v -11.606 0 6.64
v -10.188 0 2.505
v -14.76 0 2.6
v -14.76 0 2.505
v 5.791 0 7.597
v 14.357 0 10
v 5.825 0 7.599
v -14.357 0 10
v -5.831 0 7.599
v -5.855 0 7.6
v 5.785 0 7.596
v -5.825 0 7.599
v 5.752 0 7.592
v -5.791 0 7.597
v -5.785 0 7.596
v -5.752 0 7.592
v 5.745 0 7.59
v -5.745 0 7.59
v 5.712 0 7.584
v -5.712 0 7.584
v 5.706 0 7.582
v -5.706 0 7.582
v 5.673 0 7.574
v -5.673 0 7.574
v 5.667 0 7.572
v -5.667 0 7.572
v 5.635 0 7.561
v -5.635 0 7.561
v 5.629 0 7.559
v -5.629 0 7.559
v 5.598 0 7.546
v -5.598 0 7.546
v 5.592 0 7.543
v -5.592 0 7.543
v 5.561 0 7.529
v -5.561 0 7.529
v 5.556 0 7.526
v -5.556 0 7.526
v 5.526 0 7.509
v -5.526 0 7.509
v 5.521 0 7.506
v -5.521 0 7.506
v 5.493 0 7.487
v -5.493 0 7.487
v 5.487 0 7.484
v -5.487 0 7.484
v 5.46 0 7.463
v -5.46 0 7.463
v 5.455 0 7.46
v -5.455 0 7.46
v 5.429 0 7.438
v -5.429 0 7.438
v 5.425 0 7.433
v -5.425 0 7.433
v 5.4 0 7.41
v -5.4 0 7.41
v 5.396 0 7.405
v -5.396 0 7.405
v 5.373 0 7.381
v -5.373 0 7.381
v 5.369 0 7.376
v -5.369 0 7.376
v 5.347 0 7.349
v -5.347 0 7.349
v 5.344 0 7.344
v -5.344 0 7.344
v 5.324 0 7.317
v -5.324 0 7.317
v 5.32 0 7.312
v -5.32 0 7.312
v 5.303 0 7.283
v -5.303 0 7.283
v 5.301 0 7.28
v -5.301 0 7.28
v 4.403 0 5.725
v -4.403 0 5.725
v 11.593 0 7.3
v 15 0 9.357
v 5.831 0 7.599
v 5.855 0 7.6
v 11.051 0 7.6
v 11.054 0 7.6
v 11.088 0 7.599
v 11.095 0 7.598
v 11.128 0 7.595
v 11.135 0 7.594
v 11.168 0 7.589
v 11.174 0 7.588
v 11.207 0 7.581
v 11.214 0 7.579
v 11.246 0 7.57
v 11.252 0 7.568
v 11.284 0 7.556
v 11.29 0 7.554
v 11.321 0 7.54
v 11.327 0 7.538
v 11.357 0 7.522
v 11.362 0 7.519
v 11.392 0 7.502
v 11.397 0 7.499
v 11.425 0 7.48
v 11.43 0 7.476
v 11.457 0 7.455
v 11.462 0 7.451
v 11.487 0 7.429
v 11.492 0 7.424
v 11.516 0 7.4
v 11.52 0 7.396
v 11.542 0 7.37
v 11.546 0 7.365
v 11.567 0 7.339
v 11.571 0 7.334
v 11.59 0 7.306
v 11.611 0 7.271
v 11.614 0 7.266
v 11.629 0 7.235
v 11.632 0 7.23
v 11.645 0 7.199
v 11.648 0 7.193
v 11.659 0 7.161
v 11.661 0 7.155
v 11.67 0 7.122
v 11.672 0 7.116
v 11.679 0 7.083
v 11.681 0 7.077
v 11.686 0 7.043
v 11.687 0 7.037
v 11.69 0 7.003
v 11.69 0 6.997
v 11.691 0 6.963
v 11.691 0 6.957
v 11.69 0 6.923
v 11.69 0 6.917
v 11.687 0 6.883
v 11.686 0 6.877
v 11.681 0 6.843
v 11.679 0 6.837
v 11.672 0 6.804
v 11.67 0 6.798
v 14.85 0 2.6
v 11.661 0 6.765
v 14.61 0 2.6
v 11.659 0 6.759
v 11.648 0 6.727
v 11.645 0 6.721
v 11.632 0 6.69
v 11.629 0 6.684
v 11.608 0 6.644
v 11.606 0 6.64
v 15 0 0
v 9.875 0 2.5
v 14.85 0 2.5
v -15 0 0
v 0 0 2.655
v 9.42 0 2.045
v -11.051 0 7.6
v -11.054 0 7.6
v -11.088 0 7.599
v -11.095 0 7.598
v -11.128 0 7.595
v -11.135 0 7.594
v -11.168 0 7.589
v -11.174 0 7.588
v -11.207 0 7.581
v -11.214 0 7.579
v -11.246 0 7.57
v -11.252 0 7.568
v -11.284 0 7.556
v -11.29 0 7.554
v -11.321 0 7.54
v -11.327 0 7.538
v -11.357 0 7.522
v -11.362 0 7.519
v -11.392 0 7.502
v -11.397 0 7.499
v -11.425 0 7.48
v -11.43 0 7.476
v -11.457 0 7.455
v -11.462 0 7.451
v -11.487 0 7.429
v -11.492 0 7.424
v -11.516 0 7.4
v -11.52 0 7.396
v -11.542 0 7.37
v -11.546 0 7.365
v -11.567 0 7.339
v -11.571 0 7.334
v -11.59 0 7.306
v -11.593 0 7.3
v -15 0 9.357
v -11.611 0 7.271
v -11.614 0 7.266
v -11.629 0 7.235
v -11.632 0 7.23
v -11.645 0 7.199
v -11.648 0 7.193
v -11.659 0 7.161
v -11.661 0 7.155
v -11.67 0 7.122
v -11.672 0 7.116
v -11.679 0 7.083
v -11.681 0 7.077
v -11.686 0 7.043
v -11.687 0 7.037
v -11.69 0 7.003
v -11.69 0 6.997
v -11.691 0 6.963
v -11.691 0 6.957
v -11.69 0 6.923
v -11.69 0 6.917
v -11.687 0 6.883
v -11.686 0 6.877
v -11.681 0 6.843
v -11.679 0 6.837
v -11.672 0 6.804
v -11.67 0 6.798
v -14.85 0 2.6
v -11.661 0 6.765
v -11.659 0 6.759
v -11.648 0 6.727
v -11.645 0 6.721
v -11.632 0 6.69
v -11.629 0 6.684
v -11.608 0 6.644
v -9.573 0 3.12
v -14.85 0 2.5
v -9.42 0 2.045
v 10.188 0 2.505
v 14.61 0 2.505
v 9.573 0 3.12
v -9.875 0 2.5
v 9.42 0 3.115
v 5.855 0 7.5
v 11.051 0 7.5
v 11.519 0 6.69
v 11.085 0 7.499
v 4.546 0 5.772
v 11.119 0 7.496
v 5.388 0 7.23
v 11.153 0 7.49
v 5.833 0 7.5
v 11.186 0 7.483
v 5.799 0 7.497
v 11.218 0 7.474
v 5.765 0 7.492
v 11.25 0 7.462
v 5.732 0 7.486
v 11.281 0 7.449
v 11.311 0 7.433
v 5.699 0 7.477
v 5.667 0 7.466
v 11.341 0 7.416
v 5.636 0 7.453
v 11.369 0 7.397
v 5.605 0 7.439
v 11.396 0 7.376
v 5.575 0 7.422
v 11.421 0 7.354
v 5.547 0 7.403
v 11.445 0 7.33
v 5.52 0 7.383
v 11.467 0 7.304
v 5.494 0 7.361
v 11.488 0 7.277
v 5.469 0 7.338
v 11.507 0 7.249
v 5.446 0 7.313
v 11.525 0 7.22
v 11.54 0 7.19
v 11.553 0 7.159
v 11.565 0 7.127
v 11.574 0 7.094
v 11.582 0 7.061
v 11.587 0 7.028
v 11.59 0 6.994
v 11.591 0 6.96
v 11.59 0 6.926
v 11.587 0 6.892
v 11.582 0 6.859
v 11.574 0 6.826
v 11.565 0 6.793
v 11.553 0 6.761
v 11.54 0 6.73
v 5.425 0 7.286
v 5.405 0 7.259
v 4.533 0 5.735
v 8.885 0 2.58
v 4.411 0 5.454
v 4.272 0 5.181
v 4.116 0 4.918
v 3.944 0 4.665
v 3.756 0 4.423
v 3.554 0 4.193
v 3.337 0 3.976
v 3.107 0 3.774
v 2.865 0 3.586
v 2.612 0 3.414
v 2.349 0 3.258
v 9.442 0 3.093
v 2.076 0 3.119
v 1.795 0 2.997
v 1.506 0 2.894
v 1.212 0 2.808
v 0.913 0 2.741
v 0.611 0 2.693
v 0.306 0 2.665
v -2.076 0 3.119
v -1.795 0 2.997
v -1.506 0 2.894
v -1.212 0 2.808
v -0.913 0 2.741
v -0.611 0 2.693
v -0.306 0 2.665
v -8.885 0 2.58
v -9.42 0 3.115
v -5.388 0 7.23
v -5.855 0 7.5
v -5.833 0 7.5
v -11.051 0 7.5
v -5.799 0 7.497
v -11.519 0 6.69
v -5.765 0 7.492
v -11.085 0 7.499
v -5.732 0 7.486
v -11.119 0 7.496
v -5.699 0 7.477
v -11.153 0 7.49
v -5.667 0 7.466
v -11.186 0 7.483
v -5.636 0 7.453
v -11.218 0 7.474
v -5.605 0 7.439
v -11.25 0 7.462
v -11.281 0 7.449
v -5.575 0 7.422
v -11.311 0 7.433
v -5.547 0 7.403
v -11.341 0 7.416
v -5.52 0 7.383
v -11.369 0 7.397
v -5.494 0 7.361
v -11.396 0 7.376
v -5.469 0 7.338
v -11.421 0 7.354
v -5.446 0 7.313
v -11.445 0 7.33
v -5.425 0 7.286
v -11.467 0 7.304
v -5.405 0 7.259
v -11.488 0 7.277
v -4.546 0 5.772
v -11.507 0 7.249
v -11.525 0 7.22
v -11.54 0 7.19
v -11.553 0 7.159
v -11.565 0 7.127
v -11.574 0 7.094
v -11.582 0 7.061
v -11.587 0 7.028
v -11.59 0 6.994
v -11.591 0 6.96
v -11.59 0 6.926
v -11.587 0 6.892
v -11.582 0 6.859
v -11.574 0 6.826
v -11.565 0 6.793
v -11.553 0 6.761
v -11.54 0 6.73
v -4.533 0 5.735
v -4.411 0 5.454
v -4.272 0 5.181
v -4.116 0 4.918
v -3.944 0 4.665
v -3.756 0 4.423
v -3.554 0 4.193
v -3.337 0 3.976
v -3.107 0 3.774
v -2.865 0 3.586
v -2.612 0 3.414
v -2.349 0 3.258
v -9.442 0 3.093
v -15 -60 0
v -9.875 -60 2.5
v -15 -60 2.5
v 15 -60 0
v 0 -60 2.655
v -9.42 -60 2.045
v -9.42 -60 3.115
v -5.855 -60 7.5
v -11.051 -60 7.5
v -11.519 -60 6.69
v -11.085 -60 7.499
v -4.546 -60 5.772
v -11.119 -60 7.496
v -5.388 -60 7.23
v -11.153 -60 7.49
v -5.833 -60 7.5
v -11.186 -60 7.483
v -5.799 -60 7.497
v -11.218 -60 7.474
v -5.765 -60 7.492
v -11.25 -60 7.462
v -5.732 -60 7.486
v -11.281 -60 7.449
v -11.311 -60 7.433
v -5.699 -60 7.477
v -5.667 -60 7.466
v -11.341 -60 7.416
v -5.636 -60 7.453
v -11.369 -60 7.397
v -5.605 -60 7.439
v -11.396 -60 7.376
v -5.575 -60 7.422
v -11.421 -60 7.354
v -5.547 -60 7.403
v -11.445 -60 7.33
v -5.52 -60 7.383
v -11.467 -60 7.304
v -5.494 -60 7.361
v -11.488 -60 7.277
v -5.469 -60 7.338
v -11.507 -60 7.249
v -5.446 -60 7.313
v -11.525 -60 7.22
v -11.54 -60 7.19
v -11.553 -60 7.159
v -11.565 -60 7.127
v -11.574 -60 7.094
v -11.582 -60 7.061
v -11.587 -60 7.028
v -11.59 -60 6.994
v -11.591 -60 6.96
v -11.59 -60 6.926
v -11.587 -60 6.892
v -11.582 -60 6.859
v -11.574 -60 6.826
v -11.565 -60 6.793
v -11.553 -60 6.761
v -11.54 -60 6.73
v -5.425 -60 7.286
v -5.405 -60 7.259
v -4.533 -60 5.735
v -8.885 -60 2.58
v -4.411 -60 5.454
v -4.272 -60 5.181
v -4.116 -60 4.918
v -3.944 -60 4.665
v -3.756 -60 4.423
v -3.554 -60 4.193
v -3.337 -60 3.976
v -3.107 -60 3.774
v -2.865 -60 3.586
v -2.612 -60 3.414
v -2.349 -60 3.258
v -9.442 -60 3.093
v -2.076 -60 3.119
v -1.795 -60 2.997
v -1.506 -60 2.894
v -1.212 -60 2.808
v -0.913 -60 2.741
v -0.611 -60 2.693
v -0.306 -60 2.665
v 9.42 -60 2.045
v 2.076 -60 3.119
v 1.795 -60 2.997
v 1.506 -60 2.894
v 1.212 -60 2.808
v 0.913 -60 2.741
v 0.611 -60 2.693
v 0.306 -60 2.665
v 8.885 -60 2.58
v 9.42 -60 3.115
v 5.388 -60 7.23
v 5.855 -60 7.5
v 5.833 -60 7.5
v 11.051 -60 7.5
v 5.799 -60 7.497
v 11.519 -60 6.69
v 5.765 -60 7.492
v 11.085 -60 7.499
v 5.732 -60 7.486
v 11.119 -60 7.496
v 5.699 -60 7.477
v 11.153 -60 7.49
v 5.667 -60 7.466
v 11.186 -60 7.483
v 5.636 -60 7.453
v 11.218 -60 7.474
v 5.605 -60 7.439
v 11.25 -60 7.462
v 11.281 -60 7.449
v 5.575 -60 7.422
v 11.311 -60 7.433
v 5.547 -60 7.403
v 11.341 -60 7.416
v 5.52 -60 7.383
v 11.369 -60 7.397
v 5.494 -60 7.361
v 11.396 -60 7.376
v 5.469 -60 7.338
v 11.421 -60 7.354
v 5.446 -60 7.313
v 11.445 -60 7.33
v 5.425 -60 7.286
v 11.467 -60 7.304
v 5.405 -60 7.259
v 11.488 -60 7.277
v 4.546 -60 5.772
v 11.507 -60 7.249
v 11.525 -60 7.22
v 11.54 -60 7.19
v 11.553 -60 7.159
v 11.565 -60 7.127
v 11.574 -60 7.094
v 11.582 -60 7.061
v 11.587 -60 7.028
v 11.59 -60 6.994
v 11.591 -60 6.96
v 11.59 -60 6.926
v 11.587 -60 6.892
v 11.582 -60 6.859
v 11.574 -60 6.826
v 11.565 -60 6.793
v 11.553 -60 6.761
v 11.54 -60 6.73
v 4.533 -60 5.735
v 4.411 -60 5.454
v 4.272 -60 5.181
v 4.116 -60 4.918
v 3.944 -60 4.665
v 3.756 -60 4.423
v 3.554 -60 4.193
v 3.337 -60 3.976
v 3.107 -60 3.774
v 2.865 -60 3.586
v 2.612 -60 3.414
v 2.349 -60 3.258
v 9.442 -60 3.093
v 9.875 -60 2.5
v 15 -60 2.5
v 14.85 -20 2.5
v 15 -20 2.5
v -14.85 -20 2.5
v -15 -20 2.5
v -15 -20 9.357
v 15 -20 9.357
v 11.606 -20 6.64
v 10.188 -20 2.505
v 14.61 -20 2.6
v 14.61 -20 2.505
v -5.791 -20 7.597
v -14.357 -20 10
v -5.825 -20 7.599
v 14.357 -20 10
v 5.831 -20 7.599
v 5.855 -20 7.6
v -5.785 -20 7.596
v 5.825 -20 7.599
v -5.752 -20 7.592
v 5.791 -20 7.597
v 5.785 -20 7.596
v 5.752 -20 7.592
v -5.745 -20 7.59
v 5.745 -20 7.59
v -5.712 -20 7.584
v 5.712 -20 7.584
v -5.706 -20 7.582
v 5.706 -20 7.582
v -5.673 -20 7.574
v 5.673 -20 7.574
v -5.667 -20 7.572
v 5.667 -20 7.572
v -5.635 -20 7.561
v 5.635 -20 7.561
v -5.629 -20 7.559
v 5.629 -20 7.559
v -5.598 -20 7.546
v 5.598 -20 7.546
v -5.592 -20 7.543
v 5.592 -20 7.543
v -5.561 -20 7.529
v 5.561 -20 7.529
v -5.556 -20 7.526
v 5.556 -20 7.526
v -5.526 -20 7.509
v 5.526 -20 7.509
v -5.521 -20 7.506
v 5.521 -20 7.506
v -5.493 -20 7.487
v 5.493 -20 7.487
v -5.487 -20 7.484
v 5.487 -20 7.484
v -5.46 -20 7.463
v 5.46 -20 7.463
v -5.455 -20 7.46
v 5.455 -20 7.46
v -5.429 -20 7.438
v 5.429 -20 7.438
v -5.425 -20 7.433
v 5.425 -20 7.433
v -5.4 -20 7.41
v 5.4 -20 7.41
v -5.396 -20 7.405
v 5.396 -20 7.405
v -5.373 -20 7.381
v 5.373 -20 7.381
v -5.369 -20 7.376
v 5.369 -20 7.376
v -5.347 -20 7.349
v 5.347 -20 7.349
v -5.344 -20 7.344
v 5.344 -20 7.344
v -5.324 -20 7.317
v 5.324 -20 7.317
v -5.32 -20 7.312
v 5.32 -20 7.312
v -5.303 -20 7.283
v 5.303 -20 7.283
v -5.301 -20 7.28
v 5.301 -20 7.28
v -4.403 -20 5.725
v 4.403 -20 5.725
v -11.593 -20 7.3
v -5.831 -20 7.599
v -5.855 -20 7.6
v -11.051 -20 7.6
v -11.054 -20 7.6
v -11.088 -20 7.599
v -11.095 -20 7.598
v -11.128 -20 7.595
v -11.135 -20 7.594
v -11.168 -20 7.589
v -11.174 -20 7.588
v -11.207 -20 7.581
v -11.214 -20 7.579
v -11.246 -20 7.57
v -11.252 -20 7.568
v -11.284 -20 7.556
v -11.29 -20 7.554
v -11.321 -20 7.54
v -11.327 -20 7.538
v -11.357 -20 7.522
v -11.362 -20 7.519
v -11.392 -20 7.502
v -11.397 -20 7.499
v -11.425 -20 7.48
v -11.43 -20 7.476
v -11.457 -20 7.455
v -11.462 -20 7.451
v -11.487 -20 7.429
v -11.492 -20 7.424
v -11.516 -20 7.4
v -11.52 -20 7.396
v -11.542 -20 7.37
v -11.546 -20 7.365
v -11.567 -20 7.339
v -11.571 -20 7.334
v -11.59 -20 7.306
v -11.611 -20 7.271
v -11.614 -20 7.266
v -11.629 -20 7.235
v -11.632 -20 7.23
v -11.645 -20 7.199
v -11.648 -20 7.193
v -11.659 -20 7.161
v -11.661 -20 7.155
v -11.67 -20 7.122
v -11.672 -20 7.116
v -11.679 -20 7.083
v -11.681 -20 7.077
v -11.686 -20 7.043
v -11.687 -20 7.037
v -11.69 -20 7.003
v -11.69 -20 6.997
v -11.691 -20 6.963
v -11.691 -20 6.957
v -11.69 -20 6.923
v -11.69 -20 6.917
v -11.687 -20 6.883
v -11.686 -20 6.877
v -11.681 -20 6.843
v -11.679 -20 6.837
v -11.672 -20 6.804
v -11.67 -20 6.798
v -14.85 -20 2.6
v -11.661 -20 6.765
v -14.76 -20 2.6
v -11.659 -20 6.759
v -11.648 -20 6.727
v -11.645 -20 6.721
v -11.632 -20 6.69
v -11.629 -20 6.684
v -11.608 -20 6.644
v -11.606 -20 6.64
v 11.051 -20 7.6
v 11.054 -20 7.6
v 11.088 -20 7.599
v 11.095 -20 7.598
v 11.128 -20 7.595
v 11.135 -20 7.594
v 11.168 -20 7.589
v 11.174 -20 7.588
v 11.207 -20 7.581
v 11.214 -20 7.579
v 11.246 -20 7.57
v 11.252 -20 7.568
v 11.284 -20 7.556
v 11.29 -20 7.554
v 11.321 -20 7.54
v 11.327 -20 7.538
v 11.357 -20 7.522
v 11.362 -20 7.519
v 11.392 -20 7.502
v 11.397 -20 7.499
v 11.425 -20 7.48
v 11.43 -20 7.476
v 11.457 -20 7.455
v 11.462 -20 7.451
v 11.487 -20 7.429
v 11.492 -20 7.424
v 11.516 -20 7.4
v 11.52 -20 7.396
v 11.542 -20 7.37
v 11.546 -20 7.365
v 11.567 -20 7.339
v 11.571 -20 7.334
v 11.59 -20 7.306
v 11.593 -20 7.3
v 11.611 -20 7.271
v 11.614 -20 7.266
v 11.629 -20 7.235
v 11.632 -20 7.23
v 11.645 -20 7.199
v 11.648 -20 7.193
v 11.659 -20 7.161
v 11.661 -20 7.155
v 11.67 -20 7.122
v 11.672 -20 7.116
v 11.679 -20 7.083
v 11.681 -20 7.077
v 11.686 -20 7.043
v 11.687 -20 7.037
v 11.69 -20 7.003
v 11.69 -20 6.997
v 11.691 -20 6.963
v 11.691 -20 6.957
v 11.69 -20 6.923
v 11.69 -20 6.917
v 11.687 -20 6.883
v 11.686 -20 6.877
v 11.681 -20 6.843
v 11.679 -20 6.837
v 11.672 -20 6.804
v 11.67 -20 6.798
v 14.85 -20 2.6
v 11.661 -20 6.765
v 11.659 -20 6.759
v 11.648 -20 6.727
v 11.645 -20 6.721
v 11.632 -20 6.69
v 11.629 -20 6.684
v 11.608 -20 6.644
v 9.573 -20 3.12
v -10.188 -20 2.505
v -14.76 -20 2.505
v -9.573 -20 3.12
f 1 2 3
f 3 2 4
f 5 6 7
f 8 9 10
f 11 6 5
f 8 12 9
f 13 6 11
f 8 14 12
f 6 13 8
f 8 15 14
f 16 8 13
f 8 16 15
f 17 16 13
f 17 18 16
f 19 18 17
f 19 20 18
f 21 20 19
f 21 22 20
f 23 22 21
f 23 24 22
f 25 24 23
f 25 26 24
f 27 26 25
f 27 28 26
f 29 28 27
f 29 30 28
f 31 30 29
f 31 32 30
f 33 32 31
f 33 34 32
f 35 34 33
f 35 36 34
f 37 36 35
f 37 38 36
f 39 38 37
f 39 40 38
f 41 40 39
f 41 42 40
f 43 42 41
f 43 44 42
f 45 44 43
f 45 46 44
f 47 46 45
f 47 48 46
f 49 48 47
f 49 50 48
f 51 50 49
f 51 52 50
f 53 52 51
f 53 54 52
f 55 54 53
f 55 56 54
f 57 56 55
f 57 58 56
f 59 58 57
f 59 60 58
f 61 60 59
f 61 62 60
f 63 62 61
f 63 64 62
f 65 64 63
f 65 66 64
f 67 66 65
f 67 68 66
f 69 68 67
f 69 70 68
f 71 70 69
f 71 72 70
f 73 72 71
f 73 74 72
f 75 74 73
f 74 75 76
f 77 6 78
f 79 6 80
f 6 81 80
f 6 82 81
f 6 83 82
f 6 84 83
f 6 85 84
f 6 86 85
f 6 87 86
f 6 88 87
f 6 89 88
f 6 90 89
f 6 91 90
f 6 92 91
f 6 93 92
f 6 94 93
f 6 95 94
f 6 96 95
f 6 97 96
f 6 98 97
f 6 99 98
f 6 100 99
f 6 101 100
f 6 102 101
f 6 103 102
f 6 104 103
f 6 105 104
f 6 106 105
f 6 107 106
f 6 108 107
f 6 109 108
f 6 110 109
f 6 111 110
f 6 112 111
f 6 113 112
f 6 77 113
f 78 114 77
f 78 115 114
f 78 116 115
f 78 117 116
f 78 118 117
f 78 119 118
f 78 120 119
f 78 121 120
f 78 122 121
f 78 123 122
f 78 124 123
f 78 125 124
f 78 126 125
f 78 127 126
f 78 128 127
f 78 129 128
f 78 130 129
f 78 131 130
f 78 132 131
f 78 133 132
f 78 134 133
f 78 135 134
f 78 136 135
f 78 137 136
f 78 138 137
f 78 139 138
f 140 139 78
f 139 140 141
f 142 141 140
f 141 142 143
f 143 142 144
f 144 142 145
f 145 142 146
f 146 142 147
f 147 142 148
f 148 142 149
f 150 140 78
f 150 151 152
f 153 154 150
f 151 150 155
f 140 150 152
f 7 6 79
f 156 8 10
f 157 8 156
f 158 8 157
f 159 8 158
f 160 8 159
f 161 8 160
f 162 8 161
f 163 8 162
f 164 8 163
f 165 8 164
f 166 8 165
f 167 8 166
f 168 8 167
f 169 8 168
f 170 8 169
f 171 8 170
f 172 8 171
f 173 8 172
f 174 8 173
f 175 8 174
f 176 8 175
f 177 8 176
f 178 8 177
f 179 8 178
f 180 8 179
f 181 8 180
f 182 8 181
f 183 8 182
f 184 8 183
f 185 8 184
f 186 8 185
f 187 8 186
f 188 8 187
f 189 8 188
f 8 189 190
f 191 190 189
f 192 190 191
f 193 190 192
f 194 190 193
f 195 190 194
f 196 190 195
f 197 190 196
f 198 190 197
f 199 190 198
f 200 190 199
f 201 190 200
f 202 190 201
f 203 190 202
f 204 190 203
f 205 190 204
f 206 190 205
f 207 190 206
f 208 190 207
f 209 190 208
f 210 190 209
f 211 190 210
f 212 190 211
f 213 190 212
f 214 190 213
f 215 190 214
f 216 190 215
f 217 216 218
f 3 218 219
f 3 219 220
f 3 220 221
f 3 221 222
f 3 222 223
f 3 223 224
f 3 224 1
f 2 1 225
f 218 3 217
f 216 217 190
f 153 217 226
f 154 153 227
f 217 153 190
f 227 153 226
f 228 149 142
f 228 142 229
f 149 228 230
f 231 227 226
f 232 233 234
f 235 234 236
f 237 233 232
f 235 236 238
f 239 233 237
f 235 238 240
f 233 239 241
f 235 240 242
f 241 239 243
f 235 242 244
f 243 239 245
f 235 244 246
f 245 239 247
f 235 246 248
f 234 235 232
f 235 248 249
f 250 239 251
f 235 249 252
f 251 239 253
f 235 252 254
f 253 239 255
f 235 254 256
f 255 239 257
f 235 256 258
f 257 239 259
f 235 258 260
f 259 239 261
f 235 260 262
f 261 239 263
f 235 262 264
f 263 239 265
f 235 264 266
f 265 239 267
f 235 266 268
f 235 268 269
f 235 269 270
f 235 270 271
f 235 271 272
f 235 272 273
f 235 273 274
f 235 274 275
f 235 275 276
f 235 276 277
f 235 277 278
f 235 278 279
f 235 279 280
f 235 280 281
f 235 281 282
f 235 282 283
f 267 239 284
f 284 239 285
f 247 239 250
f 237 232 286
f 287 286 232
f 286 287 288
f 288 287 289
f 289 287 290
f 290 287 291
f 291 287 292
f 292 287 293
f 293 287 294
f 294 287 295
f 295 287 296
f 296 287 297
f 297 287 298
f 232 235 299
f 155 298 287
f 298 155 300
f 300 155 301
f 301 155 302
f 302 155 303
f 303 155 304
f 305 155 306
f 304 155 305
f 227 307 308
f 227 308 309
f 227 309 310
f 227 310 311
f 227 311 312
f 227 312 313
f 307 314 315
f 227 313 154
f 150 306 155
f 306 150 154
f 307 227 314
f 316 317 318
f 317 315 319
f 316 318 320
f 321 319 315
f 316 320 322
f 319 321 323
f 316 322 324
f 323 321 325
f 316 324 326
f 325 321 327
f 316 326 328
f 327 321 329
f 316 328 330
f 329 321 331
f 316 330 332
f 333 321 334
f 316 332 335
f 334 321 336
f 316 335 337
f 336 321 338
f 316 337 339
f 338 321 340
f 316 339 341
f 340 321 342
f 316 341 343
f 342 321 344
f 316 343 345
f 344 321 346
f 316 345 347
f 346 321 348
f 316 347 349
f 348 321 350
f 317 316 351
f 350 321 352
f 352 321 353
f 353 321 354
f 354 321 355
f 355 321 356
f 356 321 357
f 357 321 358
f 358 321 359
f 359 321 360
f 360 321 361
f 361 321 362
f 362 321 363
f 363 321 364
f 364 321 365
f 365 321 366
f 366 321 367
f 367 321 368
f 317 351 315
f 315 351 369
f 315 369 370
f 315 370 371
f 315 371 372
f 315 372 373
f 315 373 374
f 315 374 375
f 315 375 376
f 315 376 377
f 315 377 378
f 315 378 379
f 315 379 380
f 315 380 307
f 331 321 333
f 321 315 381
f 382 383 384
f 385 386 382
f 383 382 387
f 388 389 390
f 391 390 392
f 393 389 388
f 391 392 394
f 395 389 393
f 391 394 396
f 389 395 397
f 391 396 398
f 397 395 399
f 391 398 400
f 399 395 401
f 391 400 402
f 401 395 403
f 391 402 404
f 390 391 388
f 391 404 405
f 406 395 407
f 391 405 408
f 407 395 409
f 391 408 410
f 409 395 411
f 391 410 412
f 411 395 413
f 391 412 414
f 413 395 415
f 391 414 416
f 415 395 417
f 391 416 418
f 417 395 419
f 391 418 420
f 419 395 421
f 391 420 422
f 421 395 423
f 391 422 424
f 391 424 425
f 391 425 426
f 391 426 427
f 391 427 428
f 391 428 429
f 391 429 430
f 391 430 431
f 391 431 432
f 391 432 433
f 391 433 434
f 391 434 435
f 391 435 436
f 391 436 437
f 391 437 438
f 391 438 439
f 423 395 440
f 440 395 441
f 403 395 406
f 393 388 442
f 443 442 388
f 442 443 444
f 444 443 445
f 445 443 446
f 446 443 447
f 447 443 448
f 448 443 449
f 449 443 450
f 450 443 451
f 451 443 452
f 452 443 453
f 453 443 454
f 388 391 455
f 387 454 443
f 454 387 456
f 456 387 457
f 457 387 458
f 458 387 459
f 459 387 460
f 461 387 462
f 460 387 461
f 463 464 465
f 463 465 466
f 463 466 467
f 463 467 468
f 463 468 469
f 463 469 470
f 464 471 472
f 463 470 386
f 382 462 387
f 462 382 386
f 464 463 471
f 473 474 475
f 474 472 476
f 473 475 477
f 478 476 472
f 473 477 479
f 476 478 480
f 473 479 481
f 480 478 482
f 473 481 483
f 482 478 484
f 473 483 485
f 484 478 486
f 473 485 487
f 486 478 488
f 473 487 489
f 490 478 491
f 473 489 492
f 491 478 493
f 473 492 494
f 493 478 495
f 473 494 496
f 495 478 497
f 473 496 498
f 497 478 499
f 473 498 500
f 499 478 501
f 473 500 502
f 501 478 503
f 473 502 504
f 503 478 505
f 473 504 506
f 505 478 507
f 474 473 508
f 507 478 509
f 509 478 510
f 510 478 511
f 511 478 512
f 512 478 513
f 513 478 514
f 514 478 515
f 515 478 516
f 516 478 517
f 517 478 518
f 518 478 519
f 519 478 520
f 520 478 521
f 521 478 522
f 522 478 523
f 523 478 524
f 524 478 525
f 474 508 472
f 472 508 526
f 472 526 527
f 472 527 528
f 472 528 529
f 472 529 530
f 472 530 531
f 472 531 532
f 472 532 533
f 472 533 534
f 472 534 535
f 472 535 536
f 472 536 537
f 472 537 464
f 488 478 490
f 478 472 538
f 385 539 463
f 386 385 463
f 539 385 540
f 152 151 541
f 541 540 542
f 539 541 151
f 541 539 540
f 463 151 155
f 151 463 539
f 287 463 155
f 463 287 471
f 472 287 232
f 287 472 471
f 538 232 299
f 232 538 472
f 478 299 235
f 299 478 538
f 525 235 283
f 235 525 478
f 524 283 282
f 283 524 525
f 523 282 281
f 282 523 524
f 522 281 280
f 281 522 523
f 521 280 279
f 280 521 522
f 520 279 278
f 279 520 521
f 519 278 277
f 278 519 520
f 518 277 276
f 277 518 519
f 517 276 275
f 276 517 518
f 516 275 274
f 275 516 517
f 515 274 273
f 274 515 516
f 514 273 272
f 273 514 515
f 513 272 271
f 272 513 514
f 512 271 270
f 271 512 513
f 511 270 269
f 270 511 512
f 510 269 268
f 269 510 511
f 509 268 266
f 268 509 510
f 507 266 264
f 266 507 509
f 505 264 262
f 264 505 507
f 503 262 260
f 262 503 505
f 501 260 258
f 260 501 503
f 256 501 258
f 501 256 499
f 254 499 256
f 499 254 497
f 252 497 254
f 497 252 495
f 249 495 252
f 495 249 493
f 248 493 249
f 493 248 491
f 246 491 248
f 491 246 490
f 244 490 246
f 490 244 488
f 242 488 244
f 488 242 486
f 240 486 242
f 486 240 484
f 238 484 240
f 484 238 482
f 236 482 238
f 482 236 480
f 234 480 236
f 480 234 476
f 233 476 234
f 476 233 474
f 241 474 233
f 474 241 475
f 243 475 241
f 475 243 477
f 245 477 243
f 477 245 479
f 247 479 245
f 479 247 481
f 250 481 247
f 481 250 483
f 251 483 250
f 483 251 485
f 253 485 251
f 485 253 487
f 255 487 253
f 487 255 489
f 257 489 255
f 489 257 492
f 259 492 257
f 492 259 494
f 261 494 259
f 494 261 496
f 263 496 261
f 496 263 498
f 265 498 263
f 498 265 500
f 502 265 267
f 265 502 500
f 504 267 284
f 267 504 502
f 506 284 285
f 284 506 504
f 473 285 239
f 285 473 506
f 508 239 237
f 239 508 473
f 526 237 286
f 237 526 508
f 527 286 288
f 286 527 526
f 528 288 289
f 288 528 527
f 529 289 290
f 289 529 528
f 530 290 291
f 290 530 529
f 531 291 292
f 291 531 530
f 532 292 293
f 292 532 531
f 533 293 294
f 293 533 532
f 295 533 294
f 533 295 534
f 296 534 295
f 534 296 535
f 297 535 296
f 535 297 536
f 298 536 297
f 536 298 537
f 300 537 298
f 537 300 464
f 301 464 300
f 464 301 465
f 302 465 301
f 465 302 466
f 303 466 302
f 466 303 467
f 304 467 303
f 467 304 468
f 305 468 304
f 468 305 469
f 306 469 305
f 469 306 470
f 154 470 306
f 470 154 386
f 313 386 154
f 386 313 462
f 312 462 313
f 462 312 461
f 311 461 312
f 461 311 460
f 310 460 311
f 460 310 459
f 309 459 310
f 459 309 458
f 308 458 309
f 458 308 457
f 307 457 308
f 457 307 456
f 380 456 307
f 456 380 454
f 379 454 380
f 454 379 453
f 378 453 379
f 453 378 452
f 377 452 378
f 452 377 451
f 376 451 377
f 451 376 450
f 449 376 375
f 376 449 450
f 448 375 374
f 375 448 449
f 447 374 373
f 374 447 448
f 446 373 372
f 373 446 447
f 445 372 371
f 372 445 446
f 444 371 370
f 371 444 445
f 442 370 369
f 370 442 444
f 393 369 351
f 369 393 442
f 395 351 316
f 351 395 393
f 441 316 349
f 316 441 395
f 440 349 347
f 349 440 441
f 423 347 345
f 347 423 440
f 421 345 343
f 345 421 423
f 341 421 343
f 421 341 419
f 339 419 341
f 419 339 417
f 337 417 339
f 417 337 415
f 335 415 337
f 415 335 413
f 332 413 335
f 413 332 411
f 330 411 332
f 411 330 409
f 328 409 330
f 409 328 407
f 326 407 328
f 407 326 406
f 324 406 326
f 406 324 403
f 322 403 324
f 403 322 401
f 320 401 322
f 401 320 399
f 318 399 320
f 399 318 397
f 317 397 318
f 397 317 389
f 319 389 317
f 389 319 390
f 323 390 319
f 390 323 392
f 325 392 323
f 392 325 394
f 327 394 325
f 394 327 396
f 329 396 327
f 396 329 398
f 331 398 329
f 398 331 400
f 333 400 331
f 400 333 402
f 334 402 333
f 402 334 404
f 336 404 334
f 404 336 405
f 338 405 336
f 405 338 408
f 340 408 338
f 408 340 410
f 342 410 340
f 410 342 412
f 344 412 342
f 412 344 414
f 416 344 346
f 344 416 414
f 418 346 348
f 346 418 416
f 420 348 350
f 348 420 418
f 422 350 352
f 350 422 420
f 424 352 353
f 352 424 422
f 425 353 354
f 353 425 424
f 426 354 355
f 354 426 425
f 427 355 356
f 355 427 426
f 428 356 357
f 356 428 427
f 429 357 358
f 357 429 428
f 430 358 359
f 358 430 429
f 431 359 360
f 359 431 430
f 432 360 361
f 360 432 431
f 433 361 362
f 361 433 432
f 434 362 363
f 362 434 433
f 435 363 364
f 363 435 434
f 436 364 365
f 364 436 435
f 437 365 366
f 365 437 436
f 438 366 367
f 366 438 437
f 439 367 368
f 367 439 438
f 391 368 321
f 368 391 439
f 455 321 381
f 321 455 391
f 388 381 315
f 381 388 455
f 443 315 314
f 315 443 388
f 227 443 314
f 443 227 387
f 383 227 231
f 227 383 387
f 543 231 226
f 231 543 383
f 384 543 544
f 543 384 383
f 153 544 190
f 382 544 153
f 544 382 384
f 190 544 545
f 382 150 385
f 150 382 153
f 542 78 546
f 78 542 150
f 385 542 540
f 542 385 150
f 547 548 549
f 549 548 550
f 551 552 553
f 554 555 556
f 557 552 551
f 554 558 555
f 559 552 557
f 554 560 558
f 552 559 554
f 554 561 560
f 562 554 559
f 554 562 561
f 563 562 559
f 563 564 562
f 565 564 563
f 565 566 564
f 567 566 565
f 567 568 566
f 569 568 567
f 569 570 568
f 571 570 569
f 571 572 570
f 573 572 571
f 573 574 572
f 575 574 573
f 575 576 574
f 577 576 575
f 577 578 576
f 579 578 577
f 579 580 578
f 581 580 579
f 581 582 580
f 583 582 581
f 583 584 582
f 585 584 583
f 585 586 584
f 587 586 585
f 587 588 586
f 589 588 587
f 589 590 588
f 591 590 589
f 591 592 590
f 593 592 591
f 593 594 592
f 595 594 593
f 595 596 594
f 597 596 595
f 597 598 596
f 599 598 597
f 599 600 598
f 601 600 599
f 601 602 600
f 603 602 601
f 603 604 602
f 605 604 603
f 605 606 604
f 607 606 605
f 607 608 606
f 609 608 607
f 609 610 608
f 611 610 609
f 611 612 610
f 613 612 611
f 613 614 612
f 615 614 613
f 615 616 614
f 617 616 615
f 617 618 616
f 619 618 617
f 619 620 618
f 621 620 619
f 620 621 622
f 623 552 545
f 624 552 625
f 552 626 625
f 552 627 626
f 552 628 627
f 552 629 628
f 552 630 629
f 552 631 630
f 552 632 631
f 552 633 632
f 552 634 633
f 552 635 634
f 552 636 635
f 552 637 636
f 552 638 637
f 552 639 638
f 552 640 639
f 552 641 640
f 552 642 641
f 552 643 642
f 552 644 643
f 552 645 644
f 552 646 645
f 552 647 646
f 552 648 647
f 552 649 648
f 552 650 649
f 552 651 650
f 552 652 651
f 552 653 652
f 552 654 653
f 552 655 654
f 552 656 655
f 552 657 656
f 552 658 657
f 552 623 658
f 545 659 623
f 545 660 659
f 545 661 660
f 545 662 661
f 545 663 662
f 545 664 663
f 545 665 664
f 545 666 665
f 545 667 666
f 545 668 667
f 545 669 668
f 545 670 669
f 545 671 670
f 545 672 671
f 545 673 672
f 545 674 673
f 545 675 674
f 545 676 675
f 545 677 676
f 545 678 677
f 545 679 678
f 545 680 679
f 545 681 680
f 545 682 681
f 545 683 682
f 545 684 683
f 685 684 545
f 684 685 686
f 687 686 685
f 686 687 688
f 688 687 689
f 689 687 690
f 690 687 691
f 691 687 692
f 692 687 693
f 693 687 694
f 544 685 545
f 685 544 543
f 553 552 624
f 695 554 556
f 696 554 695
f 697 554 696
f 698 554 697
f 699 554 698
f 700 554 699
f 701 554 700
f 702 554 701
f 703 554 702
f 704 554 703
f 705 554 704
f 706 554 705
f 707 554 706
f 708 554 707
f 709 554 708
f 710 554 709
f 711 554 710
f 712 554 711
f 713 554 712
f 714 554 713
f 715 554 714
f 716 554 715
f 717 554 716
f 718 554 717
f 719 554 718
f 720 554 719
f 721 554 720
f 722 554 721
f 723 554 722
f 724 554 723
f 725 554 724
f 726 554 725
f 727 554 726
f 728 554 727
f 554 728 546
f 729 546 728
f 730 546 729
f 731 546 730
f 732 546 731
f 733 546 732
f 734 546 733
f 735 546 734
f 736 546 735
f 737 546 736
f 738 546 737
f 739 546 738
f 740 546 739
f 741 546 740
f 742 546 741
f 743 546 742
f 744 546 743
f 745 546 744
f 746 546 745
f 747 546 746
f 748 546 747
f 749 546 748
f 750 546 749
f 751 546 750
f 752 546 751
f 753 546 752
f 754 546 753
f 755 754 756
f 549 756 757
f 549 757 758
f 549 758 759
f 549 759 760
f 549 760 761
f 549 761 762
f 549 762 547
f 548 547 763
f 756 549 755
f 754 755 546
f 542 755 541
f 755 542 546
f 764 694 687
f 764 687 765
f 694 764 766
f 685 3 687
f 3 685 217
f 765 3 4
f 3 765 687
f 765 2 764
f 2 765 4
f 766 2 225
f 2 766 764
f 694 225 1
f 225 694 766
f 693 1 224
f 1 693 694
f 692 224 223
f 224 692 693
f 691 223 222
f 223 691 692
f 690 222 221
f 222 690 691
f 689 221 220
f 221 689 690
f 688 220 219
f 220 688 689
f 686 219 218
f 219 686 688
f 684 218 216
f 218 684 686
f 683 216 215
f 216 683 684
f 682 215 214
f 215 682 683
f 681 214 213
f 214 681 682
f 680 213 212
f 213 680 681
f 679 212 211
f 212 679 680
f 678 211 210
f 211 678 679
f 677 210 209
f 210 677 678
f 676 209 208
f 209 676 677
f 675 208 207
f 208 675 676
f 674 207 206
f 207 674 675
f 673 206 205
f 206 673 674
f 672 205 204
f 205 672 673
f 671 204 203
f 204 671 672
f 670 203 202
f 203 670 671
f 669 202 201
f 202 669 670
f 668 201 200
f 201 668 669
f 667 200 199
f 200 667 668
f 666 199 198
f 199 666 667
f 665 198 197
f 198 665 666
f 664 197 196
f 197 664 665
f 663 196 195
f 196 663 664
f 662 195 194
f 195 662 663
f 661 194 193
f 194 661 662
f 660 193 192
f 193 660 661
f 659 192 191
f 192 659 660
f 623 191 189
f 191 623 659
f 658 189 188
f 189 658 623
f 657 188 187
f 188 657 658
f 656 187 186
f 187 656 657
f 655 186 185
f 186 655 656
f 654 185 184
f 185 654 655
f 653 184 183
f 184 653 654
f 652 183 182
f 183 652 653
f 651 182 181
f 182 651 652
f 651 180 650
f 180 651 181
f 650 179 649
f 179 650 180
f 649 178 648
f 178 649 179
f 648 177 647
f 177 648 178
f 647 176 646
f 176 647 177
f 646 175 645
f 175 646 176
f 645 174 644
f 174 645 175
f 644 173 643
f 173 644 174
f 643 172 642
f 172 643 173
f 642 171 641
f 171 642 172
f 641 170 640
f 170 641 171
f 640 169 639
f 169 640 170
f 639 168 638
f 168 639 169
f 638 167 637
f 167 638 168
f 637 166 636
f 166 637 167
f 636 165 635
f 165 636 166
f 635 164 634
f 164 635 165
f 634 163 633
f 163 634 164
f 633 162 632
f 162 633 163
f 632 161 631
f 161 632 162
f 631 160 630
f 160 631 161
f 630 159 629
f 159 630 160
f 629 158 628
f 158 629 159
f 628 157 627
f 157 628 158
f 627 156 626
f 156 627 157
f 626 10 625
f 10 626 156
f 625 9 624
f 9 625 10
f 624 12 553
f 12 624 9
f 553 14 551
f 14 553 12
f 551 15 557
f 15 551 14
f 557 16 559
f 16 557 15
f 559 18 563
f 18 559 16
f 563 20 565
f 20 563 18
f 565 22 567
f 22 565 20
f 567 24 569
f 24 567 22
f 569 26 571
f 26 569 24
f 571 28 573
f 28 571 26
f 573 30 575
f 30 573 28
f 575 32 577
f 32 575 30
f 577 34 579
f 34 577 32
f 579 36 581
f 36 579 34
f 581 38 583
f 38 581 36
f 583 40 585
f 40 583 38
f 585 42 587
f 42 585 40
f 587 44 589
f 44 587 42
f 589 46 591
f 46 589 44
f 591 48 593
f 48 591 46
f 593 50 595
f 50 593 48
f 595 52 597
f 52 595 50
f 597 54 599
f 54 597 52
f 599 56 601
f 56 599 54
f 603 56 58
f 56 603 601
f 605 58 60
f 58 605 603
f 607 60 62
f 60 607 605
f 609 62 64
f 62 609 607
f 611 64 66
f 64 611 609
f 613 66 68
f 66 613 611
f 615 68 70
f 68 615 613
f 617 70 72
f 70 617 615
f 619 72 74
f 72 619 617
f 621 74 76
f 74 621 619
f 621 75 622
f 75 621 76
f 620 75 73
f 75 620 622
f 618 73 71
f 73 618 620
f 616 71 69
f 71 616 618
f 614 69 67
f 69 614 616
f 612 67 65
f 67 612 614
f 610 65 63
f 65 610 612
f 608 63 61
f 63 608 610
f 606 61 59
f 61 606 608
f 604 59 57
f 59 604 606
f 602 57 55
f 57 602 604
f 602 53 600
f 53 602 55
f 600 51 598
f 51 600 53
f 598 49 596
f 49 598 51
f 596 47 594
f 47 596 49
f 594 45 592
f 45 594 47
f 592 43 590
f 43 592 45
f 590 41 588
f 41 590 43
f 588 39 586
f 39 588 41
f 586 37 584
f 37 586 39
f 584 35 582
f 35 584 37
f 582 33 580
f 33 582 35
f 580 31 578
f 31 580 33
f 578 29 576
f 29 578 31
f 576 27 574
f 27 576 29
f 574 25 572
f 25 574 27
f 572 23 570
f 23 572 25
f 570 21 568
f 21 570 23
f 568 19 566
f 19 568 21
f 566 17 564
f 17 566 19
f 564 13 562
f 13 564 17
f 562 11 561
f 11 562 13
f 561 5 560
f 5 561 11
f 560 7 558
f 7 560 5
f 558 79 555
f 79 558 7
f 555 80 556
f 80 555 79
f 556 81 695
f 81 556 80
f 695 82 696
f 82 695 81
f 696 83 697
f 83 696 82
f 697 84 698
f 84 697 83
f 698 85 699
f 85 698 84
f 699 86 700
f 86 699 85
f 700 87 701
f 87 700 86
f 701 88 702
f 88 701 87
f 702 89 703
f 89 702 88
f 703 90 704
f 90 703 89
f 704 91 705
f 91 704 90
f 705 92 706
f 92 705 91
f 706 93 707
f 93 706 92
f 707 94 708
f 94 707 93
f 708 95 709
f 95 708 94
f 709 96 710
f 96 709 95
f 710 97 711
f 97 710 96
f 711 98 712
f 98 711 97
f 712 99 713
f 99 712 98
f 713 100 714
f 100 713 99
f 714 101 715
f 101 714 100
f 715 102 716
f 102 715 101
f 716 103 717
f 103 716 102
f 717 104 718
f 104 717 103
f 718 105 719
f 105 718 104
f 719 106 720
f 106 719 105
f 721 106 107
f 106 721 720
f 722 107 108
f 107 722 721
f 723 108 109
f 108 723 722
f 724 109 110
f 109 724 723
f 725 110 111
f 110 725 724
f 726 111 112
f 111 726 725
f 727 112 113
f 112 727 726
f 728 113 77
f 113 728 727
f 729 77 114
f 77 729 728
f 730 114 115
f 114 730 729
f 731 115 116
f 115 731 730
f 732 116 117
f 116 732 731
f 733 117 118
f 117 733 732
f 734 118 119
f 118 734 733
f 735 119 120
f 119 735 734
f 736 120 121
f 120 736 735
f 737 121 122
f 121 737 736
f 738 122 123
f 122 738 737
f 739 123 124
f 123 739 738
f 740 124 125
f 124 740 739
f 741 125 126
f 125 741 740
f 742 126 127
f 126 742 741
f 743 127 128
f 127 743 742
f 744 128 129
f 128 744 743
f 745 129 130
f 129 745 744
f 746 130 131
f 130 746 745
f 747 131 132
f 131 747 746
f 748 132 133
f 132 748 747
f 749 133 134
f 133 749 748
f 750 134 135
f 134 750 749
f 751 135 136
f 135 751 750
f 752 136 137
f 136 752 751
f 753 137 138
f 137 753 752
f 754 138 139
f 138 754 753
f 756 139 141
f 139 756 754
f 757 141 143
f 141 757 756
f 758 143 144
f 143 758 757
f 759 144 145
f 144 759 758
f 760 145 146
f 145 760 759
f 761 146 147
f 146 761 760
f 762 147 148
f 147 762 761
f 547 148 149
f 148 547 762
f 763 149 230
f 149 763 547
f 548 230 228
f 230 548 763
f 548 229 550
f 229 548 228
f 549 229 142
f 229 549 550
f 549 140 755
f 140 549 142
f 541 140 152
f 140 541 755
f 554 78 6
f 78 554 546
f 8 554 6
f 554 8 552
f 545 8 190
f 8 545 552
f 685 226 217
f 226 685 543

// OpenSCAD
///////////////////////////////////////////
/// OpenSCAD File by Ken_Applications /////
///////////////////////////////////////////

///The 4 Main Parameters below////////
///are for you to experiment with. ///
/////////// Enjoy ////////////////////

Slide_length = 60    ;
Slide_width = 30     ;
clearance = 0.1      ;//Clearance gap between parts... 0.1 default, 
carriage_length= 20   ;

////////////////////////////////////
//Viewing Parameters
$fn = 100    ;// Number of facets
View_parts = 4   ;//////.. 1=View Rail  2=View carriage 3= carriage for printing 4=assembly

////////////////////////////////////









/////..Below Calculations ..////
Slide_height=Slide_width/4;// the slide height is fixed at 1/4 of width
r=Slide_width*0.018;//ratio for size of radius
podfcl=Slide_width*0.22;//position of dovtail from center line
rfbt=(Slide_width/4)*0.3333333;//ratio for base thickness
bcr=Slide_width*0.1625;//blue circle radius


if (View_parts ==1) base_rail_extruded ();
if (View_parts ==2)move_carriage ();
if (View_parts ==3)print_carriage();
if (View_parts ==4)base_rail_extruded ();
if (View_parts ==4) move_carriage ();
   
///////////////////////////////////////////
/////// The Module's used /////////////////
module left_hand_rail(){
difference(){
    rotate(a=-60, v=[0,0,1])
    square([Slide_height*3,Slide_width*0.15],center=true);
    translate([0,(Slide_height*1.5)-r,0]) square([Slide_width,Slide_height*2],center=true);
    translate([0,-(Slide_height*1.5)+r,0]) square([Slide_width,Slide_height*2],center=true);
     }
}



module left_and_right_hand_rail(){
mirror(v= [0, 1, 0] ) { 
translate([podfcl,0,0]) offset(r=r) left_hand_rail();
}
 
translate([-podfcl,0,0]) offset(r=r) left_hand_rail();
}

module base_rail_without_recess(){
 union(){   
square([Slide_width/2,Slide_width/8],true);
 left_and_right_hand_rail(); 
   translate([0,-rfbt,0])  square([Slide_width,Slide_height/3],center=true);
 
 }  
}

module base_rail(){
 difference(){
  base_rail_without_recess();
   translate([0,Slide_width*.126,0])  circle(bcr);
   translate([-Slide_width*0.314,-Slide_width*0.039,0]) rotate(a=45, v=[0,0,1]) square(r*1.4,true);
 translate([Slide_width*0.314,-Slide_width*0.039,0]) rotate(a=45, v=[0,0,1]) square(r*1.4,true);
 }   
    
}


module add_bit (){
    difference(){
    translate([0,Slide_height-rfbt*2,0])  square([Slide_width,Slide_height],center=true); 
    translate([0,Slide_height-clearance-rfbt*2,0]) color("green") square([Slide_width-clearance*3,Slide_height-clearance],center=true);
    } 
}

module top_rail(){
   
  offset(r=-clearance)  
      difference(){
      translate([0,Slide_height-rfbt*2,0])square([Slide_width,Slide_height],center=true); 
      base_rail_without_recess();
    }

  union()
    add_bit();
    
    //fill in bottom gap
    translate([-Slide_width*0.492,-Slide_height*0.166,0]) square([Slide_width*0.165,clearance+0.2],false);
    translate([Slide_width*0.322,-Slide_height*0.166,0]) square([Slide_width*0.165,clearance+0.2],false);
    
 
 }
 
module top_rail_chamfered (){
 difference(){
    top_rail(); 
     
   //draw the chamfer squares
   translate([-Slide_width*0.314,-Slide_width*0.049,0]) rotate(a=45, v=[0,0,1]) square(r*2.6,true);
   translate([Slide_width*0.314,-Slide_width*0.049,0]) rotate(a=45, v=[0,0,1]) square(r*2.6,true);
   translate([-Slide_width*0.5,Slide_width*0.22,0]) rotate(a=45, v=[0,0,1]) square(r*2.6,true);
   translate([Slide_width*0.5,Slide_width*0.22,0]) rotate(a=45, v=[0,0,1]) square(r*2.6,true);
 
 }
 }
 
module base_rail_extruded (){   
translate([0,0,Slide_height/2]) rotate(a=90,v=[1,0,0])linear_extrude(0,0,Slide_length) base_rail();
}
 
module move_carriage (){
   color("Green")translate([0,-0,Slide_height/2]) rotate(a=90,v=[1,0,0])linear_extrude(0,0,carriage_length) top_rail_chamfered();
  }
 
  
 
  
module print_carriage(){
   
 rotate(a=180,v=[0,1,0]) translate([Slide_width+rfbt,0,-rfbt-Slide_height])  move_carriage(); 
   
 } 
 
 
 




//Animate_carriage=1; // 1=Animate  0= No Animation
//if (Animate_carriage==1) translate([0,$t*-Slide_length*1.1,0]) move_carriage();
//if (Animate_carriage==0) move_carriage(); 
 
 






















